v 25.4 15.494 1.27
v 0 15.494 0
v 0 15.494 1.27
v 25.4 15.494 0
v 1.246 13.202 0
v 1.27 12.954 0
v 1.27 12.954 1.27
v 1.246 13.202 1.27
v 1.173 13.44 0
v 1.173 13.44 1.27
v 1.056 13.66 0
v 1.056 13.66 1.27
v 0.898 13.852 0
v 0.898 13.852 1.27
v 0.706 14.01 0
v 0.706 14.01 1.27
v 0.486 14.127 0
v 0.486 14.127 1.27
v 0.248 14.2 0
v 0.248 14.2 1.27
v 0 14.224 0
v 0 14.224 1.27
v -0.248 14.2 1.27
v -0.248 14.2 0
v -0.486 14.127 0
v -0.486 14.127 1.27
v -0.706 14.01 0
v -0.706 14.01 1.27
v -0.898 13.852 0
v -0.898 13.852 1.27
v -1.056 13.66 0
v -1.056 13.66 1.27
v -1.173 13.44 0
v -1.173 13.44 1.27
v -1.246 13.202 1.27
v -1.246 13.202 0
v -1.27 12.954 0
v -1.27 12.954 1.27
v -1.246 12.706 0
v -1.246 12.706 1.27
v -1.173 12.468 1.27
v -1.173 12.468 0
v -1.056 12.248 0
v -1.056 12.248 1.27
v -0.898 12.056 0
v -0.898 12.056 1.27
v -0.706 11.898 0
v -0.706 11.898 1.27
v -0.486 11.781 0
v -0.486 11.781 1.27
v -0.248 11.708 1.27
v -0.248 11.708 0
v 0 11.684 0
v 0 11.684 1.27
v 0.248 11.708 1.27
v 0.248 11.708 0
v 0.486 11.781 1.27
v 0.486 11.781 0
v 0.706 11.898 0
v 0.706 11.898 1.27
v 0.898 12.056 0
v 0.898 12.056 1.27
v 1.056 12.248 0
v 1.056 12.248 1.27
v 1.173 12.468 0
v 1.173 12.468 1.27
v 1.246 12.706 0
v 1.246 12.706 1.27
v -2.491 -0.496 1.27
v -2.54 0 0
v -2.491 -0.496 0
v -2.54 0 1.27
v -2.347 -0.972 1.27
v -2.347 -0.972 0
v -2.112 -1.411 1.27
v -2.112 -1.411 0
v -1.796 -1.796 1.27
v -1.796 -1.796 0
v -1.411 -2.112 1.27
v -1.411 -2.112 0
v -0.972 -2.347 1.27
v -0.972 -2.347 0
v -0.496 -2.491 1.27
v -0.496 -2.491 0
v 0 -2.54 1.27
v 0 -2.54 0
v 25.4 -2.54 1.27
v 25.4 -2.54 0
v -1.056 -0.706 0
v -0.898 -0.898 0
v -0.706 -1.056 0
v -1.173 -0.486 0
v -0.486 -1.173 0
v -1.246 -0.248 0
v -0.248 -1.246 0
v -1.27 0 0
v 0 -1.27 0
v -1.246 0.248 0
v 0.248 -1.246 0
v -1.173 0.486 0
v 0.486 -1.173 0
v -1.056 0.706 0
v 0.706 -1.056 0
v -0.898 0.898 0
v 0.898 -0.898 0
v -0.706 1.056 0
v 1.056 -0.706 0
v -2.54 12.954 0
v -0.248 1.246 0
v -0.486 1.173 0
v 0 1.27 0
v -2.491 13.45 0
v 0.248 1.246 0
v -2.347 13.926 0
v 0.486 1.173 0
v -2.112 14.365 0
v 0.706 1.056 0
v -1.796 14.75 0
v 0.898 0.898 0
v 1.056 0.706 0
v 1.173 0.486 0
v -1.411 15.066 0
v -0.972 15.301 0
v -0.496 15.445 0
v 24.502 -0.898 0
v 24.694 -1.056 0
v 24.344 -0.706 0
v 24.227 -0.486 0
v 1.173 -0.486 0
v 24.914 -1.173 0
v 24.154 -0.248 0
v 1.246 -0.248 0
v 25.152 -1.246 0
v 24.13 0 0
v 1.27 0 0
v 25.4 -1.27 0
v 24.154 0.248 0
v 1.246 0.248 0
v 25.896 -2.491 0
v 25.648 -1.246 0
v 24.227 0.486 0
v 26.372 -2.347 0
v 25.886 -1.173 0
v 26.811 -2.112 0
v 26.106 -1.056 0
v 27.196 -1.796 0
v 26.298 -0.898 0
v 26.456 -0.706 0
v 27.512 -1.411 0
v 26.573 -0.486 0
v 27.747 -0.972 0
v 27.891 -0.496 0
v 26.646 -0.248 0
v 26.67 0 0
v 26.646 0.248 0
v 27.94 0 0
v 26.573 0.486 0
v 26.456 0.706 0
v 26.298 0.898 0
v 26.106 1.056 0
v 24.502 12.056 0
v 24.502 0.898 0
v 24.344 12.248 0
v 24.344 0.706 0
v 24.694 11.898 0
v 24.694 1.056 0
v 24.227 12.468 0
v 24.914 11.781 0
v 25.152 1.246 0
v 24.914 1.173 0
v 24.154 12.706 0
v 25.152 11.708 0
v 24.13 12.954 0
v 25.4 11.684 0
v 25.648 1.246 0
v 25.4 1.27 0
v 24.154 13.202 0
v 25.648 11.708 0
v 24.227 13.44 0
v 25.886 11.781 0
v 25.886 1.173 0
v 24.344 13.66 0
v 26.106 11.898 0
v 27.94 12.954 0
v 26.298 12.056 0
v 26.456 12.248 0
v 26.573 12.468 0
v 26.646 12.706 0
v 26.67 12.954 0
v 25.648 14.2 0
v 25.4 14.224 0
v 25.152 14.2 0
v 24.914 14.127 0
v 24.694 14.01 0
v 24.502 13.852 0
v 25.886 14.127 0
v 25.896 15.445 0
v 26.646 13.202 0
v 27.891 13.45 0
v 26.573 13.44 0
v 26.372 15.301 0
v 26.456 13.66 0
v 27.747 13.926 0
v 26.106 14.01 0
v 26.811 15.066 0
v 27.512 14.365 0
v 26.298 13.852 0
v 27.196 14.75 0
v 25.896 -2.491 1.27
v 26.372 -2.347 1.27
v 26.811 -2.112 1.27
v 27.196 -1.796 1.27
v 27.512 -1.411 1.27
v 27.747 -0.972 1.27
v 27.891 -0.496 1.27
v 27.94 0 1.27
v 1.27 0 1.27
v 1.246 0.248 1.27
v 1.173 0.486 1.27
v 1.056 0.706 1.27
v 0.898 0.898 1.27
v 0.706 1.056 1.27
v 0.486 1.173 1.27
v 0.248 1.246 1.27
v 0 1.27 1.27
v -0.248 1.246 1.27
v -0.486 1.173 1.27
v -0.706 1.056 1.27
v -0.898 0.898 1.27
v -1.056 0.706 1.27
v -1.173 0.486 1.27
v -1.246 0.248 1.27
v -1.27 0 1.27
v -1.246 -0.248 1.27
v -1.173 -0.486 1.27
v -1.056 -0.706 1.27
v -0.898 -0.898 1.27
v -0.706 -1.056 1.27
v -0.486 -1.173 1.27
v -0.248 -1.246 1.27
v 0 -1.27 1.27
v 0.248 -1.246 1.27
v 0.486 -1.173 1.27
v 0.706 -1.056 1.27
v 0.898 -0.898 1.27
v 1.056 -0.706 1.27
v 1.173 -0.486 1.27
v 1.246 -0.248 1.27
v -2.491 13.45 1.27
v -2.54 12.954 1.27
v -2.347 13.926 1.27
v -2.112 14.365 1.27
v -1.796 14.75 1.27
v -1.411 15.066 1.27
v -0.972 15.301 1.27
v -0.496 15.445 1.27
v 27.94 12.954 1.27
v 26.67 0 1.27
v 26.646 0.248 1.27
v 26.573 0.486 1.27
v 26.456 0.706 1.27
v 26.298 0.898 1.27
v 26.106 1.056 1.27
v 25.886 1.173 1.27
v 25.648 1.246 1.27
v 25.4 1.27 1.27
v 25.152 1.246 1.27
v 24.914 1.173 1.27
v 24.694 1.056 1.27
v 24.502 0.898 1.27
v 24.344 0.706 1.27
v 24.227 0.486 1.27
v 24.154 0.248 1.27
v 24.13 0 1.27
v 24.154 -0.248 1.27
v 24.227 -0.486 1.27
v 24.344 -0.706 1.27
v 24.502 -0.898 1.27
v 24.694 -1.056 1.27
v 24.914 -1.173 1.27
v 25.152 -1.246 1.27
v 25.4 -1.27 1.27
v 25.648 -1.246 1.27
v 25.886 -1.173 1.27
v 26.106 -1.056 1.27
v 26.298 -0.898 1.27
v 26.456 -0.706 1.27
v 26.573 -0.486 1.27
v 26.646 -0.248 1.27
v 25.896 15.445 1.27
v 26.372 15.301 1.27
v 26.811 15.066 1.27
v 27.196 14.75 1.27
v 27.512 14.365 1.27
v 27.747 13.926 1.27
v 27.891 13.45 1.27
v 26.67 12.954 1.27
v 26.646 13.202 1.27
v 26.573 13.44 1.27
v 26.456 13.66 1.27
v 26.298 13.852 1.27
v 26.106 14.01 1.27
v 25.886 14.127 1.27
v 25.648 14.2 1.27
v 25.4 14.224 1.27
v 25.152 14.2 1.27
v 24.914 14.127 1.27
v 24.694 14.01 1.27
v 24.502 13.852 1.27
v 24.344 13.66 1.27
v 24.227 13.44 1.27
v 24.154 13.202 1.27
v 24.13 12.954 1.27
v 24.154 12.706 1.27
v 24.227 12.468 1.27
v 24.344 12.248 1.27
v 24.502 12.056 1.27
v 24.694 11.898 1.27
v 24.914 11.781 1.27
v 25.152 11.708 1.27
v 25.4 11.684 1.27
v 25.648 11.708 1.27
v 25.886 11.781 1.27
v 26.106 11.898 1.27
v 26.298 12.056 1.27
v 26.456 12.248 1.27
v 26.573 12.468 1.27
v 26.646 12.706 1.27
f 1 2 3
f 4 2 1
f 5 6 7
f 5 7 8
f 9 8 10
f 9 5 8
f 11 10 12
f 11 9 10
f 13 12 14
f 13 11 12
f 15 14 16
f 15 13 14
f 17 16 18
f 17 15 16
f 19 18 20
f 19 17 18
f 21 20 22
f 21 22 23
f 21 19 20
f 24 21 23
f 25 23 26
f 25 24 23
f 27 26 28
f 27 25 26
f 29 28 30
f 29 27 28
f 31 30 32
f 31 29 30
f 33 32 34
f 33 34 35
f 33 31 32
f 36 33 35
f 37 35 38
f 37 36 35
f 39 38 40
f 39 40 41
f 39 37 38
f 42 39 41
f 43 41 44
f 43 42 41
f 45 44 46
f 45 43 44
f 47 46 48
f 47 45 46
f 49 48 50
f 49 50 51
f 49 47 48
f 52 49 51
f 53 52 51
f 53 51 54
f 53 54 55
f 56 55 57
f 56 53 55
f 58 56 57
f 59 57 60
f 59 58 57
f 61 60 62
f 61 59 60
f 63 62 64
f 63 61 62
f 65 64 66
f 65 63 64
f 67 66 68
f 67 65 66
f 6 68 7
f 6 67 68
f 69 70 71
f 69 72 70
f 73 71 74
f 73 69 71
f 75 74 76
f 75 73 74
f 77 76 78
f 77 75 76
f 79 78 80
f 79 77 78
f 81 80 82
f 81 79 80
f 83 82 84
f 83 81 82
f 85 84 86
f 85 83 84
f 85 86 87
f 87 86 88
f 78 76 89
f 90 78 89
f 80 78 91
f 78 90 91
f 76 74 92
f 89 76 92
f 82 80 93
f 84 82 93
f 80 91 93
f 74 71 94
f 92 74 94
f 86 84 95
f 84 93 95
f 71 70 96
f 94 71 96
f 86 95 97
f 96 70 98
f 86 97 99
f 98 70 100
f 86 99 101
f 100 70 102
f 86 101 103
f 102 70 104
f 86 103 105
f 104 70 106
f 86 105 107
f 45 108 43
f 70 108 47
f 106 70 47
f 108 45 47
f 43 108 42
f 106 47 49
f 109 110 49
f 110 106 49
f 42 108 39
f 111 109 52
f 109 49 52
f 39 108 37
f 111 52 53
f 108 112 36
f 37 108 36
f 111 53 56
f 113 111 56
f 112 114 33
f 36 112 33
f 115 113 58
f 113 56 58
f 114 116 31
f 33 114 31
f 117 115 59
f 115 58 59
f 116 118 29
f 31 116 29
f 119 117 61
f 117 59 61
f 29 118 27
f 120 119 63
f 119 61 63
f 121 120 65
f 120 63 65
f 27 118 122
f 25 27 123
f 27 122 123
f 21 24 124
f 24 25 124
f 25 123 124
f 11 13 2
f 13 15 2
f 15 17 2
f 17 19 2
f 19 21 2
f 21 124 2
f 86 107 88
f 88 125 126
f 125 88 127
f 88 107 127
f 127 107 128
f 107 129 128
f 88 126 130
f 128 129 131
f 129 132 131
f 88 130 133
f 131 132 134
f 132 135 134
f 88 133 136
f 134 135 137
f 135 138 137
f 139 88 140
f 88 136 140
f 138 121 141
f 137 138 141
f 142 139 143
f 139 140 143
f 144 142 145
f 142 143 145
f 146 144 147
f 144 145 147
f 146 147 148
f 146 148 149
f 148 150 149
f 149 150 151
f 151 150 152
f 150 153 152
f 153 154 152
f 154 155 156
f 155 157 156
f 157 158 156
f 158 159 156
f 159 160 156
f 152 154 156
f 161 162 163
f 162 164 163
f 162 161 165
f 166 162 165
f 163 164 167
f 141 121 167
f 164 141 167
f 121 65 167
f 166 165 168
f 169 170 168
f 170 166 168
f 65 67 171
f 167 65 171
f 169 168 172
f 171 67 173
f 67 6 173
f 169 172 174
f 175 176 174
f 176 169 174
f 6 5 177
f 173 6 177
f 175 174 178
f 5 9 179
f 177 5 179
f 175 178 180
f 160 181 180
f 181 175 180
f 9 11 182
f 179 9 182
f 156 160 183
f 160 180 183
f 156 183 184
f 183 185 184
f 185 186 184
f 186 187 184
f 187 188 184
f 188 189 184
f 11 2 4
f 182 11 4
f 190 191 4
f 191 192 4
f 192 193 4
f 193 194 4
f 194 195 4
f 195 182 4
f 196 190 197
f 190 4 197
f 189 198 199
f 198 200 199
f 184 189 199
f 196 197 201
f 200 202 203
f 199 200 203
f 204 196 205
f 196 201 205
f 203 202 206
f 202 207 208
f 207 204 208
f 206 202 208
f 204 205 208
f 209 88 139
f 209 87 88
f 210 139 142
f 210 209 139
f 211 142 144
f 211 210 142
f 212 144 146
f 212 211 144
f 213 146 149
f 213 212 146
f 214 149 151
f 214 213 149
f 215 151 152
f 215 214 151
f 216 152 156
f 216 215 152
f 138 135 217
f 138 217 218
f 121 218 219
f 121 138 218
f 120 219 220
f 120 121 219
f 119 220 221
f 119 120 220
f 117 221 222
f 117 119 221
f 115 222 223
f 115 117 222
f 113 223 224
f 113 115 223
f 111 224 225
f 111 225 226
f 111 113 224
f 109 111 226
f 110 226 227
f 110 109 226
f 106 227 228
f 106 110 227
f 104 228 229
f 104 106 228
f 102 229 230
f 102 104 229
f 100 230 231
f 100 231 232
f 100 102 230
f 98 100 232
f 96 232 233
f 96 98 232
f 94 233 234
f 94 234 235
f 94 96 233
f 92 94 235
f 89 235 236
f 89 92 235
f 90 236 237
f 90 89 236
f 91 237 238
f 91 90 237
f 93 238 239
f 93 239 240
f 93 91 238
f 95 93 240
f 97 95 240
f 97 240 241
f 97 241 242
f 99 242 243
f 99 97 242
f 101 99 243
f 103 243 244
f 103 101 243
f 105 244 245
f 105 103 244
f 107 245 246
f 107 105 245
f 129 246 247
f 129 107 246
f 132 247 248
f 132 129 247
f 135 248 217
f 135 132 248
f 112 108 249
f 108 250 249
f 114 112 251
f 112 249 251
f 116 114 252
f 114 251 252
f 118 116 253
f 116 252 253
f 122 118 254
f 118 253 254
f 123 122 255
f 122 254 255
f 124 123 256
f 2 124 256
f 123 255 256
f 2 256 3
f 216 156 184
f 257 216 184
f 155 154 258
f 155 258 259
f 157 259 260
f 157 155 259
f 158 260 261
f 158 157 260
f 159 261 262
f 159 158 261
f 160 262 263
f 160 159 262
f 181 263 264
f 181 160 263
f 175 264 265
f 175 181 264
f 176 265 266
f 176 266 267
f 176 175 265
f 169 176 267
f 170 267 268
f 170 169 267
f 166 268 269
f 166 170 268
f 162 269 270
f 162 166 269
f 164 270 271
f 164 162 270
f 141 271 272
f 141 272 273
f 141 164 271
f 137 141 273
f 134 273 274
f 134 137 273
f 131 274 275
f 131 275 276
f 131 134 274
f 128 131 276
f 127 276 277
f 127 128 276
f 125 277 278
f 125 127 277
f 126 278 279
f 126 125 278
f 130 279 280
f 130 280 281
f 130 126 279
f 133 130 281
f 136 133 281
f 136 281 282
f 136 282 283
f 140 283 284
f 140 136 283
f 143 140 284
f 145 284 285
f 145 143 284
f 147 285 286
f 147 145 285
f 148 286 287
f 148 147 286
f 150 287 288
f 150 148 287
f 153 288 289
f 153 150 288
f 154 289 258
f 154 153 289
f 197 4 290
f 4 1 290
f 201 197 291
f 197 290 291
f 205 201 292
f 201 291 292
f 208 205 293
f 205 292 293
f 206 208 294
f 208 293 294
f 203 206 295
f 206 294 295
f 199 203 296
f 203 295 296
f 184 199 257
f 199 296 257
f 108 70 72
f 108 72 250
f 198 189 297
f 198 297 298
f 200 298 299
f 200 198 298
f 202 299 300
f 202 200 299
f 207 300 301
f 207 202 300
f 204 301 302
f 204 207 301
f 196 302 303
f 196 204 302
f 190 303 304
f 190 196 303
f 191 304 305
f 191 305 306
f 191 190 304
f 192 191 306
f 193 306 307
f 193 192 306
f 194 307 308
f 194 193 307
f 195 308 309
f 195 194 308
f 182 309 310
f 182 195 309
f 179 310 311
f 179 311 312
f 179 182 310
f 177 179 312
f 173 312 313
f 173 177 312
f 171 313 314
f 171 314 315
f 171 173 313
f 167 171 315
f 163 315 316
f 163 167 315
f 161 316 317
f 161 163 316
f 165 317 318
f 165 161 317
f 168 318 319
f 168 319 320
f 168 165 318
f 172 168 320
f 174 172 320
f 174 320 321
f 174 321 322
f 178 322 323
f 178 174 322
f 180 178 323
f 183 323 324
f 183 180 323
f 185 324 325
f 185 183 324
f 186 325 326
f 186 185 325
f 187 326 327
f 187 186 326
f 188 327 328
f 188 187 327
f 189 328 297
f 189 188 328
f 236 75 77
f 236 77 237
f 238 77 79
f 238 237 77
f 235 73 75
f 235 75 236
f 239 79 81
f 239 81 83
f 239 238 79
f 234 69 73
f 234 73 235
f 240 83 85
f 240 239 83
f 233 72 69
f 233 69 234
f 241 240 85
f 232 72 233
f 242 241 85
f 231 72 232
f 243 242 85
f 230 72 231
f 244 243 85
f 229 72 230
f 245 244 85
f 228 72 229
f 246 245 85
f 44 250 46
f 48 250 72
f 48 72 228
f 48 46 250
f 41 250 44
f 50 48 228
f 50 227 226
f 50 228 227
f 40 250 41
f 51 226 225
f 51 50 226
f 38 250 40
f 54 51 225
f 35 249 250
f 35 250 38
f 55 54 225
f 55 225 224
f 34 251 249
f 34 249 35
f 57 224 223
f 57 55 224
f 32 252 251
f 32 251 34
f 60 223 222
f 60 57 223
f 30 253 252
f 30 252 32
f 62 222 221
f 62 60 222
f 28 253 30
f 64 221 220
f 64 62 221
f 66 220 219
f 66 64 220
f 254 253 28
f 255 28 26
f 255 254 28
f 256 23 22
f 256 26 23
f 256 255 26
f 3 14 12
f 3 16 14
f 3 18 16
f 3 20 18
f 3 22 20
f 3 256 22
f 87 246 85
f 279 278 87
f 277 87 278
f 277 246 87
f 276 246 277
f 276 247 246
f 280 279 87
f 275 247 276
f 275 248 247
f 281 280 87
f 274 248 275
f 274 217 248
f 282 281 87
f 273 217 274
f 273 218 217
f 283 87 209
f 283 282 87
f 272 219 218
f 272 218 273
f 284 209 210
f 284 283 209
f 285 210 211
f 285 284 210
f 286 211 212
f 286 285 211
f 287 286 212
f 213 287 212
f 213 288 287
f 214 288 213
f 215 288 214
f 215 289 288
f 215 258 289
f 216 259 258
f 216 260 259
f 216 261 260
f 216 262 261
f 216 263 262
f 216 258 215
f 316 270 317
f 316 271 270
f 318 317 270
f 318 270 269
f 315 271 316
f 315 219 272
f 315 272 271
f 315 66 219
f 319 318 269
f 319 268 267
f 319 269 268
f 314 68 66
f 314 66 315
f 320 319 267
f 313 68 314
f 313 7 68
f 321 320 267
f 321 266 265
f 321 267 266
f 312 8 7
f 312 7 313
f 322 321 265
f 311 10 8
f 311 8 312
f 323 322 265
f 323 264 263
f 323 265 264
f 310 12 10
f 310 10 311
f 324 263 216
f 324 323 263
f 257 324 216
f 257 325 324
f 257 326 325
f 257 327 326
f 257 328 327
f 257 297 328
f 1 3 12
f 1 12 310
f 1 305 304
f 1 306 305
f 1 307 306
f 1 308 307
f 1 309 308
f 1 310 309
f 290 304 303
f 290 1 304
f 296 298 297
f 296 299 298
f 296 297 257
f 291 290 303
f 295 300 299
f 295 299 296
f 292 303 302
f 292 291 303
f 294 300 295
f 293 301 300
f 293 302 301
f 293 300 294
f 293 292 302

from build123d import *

# Parameters (mm, degrees)
SKETCH1_W           = 30.48
SKETCH1_H           = 18.034
SKETCH1_R           = 1.27
BOSS_EXTRUDE1_DEPTH = 1.27
FILLET1_R           = 2.54


with BuildPart() as part:
    # Sketch1 → Boss-Extrude1 (new body)
    with BuildSketch(Plane.XY):
        with Locations((12.7, 6.477)):
            Rectangle(SKETCH1_W, SKETCH1_H)
        with Locations((0, 12.954)):
            Circle(SKETCH1_R, mode=Mode.SUBTRACT)
        Circle(SKETCH1_R, mode=Mode.SUBTRACT)
        with Locations((25.4, 12.954)):
            Circle(SKETCH1_R, mode=Mode.SUBTRACT)
        with Locations((25.4, 0)):
            Circle(SKETCH1_R, mode=Mode.SUBTRACT)
    extrude(amount=BOSS_EXTRUDE1_DEPTH)

    # Fillet1
    fillet1_edges = [part.edges().sort_by_distance(p)[0] for p in [
        (27.94, 15.494, 0.635),
        (27.94, -2.54, 0.635),
        (-2.54, -2.54, 0.635),
        (-2.54, 15.494, 0.635),
    ]]
    fillet(fillet1_edges, radius=FILLET1_R)


solid = part.part
